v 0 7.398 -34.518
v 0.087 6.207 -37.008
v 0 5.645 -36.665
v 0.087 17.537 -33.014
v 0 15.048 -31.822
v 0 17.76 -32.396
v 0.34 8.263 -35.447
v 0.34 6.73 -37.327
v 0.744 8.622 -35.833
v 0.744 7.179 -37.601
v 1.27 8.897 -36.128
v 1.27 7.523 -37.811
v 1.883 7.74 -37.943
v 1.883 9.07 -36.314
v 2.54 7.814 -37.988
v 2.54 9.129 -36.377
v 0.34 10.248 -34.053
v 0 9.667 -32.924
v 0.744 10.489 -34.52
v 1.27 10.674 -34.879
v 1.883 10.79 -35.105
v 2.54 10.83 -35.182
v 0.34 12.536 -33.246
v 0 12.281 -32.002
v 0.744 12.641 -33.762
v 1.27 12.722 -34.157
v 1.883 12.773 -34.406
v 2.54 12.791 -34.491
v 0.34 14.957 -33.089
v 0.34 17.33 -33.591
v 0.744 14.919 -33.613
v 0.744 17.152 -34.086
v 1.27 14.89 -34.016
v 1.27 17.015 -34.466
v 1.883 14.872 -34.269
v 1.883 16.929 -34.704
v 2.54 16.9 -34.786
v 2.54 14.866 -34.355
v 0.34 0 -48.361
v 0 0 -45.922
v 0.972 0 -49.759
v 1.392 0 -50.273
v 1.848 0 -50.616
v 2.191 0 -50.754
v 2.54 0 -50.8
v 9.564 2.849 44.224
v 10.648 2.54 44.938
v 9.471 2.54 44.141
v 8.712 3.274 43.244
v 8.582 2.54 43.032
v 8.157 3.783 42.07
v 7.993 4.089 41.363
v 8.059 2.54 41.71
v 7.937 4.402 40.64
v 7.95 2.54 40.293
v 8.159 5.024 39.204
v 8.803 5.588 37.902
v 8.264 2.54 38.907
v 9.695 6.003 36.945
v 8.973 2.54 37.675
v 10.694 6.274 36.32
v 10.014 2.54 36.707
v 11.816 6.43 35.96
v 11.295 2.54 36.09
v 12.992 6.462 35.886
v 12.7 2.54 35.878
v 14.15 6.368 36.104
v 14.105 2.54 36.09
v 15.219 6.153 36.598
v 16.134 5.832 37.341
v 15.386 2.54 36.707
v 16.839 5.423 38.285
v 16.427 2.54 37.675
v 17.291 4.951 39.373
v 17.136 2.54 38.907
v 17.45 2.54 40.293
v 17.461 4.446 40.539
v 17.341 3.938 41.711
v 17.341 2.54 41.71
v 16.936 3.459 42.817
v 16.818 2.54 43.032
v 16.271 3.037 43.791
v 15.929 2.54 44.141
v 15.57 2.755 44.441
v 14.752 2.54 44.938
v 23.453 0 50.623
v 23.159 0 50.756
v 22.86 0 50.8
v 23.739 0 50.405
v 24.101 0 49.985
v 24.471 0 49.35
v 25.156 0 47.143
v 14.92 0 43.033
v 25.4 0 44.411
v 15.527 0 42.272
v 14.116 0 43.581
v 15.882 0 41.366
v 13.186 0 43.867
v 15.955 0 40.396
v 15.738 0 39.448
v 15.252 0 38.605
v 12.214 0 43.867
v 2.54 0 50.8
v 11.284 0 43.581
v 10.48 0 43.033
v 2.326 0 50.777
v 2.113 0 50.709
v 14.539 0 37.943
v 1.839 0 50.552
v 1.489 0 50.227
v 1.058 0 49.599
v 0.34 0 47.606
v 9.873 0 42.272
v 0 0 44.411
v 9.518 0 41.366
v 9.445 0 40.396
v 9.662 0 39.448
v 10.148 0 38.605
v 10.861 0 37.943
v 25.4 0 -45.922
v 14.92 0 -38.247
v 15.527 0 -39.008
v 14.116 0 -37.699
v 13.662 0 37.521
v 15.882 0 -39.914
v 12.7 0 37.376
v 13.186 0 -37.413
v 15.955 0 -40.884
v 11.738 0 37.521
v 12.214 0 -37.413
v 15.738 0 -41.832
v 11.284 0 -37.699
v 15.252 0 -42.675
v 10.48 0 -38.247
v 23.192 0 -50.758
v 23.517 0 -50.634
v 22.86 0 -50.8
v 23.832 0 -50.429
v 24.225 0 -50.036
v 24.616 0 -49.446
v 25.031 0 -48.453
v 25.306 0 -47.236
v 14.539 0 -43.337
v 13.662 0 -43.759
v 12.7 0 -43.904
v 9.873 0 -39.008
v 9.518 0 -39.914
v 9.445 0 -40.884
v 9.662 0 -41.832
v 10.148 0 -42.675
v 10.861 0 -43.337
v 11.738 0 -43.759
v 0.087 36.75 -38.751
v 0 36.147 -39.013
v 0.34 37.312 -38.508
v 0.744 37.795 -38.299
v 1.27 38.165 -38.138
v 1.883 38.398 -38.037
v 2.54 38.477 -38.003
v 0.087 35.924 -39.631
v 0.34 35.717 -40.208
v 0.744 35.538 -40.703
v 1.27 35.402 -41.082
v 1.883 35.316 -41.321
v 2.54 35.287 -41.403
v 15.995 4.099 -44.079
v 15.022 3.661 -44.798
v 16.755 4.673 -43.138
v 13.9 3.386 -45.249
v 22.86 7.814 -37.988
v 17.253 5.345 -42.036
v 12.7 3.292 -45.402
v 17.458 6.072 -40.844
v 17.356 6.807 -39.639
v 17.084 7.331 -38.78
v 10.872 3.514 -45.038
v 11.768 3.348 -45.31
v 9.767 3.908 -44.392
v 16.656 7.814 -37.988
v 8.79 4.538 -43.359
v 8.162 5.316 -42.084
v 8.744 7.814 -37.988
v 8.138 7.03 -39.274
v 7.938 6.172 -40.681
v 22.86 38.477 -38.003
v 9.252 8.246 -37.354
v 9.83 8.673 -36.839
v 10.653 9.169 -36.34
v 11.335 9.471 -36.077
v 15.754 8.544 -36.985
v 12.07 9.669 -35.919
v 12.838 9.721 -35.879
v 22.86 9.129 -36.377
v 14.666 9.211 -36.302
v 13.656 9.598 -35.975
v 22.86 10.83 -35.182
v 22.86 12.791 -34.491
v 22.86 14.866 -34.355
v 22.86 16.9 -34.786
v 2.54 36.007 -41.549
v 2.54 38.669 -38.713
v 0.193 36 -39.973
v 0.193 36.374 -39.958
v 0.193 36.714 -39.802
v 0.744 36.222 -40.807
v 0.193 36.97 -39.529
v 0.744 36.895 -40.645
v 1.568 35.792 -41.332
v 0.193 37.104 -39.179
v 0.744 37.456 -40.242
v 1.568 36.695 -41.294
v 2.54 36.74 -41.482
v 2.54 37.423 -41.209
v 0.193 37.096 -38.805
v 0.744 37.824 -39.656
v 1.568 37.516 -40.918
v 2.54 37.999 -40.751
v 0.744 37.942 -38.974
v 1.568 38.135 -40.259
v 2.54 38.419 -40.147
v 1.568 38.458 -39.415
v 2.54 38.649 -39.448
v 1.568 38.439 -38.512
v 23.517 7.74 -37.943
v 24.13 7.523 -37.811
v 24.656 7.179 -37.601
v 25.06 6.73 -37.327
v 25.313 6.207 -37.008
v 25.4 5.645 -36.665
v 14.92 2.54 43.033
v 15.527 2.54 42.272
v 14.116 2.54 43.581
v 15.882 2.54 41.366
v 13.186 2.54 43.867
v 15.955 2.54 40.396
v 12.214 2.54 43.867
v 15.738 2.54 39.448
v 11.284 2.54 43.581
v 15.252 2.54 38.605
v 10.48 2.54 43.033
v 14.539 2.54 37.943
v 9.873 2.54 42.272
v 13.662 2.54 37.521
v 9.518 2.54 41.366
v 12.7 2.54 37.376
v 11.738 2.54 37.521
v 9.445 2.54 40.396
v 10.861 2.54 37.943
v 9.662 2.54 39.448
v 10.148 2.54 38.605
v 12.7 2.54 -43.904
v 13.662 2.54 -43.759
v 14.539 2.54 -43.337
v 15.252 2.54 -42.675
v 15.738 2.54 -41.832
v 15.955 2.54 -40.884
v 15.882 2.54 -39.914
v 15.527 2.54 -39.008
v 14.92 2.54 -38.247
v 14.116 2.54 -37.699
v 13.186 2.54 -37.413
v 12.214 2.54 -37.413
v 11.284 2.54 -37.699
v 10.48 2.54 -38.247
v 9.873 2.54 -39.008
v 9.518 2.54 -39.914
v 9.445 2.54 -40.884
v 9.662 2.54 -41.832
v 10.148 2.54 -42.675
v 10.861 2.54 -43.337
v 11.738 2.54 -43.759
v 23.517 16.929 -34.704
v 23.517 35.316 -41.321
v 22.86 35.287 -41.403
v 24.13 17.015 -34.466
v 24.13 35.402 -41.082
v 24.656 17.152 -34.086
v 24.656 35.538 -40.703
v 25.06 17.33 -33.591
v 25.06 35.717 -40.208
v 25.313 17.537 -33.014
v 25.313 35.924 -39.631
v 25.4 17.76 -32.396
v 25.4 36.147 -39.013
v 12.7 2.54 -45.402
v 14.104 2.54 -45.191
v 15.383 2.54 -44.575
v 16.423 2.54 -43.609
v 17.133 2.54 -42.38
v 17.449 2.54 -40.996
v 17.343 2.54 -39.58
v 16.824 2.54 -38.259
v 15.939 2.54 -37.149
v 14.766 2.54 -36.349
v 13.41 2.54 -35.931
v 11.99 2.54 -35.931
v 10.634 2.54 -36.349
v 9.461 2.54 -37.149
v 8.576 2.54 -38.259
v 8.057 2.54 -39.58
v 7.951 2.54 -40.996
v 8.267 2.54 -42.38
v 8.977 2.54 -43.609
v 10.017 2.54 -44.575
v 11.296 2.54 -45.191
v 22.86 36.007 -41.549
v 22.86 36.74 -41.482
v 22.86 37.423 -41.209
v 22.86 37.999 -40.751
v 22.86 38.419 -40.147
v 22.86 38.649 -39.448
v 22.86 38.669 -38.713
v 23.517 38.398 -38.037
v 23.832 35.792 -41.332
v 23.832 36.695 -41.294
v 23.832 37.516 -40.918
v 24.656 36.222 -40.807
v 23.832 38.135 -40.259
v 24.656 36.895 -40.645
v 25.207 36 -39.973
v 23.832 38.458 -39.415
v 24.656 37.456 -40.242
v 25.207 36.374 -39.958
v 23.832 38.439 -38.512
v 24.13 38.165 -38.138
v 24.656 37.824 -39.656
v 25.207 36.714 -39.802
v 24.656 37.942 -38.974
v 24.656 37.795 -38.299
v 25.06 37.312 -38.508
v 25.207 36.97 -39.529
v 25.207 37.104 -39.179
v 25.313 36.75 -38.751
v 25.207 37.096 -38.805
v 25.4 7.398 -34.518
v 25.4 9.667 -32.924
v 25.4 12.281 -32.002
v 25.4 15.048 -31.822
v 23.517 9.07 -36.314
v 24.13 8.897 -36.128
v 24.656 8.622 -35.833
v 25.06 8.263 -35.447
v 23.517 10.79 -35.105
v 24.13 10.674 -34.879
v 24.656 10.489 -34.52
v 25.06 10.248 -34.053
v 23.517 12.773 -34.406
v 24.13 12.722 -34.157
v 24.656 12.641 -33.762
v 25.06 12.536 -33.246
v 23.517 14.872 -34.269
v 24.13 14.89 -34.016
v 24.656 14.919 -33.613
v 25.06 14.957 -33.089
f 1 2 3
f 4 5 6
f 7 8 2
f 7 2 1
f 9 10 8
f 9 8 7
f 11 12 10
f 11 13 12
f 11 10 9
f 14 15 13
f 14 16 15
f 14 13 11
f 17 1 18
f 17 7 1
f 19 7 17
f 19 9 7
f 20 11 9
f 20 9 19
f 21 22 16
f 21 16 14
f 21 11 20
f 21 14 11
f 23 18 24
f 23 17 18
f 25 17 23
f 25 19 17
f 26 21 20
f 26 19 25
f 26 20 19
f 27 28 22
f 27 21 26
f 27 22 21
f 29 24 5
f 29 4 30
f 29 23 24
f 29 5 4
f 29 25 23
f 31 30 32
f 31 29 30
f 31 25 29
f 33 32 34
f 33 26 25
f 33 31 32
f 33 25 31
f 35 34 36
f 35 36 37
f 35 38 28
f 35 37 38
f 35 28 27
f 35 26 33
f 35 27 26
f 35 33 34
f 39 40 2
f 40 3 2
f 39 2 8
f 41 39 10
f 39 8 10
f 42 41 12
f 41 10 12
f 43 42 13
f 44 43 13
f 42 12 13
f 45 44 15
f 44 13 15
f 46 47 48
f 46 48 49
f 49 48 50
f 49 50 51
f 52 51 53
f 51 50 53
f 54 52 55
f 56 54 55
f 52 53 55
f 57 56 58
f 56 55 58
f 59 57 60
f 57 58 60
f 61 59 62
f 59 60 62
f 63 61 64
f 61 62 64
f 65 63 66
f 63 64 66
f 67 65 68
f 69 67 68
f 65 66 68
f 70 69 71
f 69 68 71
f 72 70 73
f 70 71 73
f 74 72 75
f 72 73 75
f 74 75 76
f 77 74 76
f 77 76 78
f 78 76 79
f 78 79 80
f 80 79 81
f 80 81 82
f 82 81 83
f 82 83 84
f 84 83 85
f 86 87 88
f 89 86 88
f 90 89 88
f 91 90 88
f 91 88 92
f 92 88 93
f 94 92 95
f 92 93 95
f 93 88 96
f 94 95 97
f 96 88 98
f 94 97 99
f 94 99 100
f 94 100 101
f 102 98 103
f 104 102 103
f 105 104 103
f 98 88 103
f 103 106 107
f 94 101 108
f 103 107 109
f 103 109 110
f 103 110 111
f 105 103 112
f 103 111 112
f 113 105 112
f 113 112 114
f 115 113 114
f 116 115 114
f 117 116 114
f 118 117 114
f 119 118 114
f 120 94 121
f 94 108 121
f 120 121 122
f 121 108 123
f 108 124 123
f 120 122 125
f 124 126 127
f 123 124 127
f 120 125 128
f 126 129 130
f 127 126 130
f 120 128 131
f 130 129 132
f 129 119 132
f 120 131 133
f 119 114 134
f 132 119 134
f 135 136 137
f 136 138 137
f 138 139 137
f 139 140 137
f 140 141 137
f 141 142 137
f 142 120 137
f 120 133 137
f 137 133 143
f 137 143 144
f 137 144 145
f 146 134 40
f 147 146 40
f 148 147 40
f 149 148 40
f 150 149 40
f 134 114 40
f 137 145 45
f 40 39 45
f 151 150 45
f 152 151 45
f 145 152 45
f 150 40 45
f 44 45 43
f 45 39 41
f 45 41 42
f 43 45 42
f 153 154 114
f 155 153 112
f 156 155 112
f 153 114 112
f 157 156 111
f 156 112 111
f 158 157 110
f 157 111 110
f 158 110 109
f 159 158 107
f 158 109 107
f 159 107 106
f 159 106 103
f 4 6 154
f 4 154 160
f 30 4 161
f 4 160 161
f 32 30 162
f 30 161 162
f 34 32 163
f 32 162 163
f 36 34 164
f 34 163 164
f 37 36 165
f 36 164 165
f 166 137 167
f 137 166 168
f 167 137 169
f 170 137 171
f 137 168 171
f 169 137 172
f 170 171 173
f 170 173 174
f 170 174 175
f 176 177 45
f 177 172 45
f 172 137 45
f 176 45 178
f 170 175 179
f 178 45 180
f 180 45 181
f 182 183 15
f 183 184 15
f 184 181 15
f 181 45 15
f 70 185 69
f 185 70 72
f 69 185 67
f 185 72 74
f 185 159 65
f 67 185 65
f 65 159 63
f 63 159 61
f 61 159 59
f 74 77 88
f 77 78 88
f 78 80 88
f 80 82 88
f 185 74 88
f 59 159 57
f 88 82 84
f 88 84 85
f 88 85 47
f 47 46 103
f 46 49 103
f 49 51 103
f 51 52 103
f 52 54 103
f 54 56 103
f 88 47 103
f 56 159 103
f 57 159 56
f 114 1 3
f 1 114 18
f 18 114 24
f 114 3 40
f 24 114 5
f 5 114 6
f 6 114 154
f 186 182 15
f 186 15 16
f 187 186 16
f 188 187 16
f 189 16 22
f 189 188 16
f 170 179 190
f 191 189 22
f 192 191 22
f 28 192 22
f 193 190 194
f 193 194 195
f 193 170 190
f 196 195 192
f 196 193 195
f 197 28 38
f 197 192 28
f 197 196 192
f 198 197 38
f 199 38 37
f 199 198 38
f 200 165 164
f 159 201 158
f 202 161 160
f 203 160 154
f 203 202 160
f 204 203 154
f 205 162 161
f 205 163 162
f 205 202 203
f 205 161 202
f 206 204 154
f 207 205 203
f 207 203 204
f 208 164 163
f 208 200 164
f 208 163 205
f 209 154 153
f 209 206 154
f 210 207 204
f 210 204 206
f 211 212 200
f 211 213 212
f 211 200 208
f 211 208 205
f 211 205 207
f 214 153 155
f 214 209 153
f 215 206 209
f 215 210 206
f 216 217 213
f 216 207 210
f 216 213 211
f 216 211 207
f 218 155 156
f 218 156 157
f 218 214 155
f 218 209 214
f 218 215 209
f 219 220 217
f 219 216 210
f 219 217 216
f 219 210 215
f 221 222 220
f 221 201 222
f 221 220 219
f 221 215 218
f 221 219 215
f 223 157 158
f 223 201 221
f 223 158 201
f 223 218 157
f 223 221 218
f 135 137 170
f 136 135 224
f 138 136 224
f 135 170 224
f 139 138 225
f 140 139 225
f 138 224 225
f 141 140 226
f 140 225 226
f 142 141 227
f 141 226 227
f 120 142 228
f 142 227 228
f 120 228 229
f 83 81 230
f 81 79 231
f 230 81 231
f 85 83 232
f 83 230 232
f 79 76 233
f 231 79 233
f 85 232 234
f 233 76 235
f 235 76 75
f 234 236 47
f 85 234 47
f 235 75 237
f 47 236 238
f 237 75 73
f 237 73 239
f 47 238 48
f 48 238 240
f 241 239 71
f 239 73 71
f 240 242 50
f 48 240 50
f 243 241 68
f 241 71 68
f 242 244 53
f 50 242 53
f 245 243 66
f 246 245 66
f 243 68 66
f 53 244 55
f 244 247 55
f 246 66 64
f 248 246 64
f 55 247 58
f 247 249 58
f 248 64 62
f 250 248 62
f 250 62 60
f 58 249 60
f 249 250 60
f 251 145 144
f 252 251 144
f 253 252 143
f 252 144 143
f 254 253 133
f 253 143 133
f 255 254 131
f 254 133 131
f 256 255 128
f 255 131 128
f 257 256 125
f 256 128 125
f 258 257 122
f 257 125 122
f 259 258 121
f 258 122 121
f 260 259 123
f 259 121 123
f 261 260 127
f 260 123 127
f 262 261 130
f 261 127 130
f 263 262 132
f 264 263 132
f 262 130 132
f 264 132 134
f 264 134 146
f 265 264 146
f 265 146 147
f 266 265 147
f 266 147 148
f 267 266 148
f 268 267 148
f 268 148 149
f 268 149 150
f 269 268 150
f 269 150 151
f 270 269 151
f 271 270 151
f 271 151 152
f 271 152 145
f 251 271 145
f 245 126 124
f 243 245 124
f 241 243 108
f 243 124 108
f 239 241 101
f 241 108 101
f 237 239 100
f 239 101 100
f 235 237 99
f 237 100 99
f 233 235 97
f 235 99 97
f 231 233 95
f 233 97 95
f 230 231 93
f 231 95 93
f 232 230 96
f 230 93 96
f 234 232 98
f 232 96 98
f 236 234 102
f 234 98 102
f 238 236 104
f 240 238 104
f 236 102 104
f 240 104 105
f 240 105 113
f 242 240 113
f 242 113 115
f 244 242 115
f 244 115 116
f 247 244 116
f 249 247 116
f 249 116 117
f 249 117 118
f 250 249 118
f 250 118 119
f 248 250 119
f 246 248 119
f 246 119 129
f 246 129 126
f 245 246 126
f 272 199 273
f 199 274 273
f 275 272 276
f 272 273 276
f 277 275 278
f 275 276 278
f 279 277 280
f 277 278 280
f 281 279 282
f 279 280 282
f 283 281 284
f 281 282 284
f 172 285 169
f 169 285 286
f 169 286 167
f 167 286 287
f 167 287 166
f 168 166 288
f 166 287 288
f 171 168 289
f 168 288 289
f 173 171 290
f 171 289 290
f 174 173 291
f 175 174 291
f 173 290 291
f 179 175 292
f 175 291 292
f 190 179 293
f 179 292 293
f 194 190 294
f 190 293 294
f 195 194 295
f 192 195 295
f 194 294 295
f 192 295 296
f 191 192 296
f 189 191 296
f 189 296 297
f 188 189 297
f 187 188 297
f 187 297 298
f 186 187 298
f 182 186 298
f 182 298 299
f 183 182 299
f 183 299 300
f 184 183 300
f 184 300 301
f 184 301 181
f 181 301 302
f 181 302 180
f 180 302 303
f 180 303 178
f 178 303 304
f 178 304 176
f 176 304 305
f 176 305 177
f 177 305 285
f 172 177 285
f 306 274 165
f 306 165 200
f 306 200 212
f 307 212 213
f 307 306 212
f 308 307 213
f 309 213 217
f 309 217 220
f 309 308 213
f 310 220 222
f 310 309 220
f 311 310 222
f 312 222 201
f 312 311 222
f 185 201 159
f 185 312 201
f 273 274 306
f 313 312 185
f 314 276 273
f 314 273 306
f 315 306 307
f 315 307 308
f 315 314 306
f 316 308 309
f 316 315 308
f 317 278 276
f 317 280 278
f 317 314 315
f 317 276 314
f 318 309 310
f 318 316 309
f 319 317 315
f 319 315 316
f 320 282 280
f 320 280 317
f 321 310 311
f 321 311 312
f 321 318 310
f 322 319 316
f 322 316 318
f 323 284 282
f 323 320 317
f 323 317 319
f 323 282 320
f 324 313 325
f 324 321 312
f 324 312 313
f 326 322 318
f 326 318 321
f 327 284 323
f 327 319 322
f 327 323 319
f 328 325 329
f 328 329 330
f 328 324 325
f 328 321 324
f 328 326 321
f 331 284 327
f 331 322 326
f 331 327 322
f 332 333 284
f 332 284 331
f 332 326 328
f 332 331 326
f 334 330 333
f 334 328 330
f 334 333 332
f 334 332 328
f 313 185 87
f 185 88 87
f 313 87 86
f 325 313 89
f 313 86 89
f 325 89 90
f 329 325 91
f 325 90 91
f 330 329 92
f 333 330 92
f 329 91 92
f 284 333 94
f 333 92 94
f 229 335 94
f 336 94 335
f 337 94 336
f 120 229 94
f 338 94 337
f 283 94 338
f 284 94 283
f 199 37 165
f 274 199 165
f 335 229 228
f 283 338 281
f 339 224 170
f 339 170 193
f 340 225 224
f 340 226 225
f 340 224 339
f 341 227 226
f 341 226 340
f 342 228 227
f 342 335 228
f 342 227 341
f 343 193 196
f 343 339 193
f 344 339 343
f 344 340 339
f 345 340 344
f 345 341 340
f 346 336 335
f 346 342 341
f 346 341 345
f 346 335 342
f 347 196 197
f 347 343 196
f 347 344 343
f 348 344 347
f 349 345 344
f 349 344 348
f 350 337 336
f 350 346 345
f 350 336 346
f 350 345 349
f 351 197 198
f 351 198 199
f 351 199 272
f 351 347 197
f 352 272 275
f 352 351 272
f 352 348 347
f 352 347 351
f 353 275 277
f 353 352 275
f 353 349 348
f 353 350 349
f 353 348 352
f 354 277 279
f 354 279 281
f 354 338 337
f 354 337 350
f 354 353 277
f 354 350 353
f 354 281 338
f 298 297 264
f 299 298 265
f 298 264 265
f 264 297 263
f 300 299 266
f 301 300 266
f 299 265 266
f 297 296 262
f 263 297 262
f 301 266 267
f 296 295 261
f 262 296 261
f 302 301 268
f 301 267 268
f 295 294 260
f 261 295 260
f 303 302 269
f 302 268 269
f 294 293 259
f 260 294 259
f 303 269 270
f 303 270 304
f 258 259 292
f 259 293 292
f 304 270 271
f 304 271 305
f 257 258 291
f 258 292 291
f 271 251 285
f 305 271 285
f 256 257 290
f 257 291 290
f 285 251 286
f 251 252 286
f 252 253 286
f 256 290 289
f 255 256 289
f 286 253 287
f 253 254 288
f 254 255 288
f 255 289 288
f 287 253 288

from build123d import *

# Parameters (mm, degrees)
BOSS_EXTRUDE1_DEPTH = 25.4
FILLET4_R           = 7.62
FILLET5_R           = 2.54
FILLET6_R           = 2.54
SKETCH2_R           = 3.2639
CUT_EXTRUDE1_DEPTH  = 10.16
SKETCH3_R           = 4.7625
CUT_EXTRUDE4_DEPTH  = 10.16


with BuildPart() as part:
    # Sketch1 → Boss-Extrude1 (new body)
    with BuildSketch(Plane(origin=(0, 0, 0), x_dir=(0, 0, -1), z_dir=(1, 0, 0))):
        Polygon((-50.8, 0), (50.8, 0), (32.681037195, 11.050662882), (43.390895004, 40.811843798), align=None)
    extrude(amount=BOSS_EXTRUDE1_DEPTH)

    # Fillet4
    fillet4_edges = [part.edges().sort_by_distance(p)[0] for p in [
        (12.7, 11.050662882, -32.681037195),
    ]]
    fillet(fillet4_edges, radius=FILLET4_R)

    # Fillet5
    fillet5_edges = [part.edges().sort_by_distance(p)[0] for p in [
        (12.7, 40.811843798, -43.390895004),
    ]]
    fillet(fillet5_edges, radius=FILLET5_R)

    # Fillet6
    fillet6_edges = [part.edges().sort_by_distance(p)[0] for p in [
        (25.4, 3.906974274, -44.39402035),
        (0, 26.09308805, -38.094203934),
        (25.4, 26.09308805, -38.094203934),
        (0, 11.786560732, -34.769020969),
        (25.4, 11.786560732, -34.769020969),
        (0, 19.238614503, 6.398616724),
        (25.4, 19.238614503, 6.398616724),
        (0, 37.998707408, -40.750789597),
        (25.4, 37.998707408, -40.750789597),
        (0, 3.906974274, -44.39402035),
    ]]
    fillet(fillet6_edges, radius=FILLET6_R)

    # Sketch2 → Cut-Extrude1 (cut)
    with BuildSketch(Plane.XZ):
        with Locations(Location((12.7, 40.64, 0), (0, 0, 270))):
            Circle(SKETCH2_R)
        with Locations(Location((12.7, -40.64, 0), (0, 0, 270))):
            Circle(SKETCH2_R)
    extrude(amount=-CUT_EXTRUDE1_DEPTH, mode=Mode.SUBTRACT)

    # Sketch3 → Cut-Extrude4 (cut)
    with BuildSketch(Plane(origin=(0, 2.54, 0), x_dir=(-1, 0, 0), z_dir=(0, -1, 0))):
        with Locations((-12.7, -40.64)):
            Circle(SKETCH3_R)
        with Locations(Location((-12.7, 40.64, 0), (0, 0, 90))):
            Circle(SKETCH3_R)
    extrude(amount=-CUT_EXTRUDE4_DEPTH, mode=Mode.SUBTRACT)


solid = part.part
